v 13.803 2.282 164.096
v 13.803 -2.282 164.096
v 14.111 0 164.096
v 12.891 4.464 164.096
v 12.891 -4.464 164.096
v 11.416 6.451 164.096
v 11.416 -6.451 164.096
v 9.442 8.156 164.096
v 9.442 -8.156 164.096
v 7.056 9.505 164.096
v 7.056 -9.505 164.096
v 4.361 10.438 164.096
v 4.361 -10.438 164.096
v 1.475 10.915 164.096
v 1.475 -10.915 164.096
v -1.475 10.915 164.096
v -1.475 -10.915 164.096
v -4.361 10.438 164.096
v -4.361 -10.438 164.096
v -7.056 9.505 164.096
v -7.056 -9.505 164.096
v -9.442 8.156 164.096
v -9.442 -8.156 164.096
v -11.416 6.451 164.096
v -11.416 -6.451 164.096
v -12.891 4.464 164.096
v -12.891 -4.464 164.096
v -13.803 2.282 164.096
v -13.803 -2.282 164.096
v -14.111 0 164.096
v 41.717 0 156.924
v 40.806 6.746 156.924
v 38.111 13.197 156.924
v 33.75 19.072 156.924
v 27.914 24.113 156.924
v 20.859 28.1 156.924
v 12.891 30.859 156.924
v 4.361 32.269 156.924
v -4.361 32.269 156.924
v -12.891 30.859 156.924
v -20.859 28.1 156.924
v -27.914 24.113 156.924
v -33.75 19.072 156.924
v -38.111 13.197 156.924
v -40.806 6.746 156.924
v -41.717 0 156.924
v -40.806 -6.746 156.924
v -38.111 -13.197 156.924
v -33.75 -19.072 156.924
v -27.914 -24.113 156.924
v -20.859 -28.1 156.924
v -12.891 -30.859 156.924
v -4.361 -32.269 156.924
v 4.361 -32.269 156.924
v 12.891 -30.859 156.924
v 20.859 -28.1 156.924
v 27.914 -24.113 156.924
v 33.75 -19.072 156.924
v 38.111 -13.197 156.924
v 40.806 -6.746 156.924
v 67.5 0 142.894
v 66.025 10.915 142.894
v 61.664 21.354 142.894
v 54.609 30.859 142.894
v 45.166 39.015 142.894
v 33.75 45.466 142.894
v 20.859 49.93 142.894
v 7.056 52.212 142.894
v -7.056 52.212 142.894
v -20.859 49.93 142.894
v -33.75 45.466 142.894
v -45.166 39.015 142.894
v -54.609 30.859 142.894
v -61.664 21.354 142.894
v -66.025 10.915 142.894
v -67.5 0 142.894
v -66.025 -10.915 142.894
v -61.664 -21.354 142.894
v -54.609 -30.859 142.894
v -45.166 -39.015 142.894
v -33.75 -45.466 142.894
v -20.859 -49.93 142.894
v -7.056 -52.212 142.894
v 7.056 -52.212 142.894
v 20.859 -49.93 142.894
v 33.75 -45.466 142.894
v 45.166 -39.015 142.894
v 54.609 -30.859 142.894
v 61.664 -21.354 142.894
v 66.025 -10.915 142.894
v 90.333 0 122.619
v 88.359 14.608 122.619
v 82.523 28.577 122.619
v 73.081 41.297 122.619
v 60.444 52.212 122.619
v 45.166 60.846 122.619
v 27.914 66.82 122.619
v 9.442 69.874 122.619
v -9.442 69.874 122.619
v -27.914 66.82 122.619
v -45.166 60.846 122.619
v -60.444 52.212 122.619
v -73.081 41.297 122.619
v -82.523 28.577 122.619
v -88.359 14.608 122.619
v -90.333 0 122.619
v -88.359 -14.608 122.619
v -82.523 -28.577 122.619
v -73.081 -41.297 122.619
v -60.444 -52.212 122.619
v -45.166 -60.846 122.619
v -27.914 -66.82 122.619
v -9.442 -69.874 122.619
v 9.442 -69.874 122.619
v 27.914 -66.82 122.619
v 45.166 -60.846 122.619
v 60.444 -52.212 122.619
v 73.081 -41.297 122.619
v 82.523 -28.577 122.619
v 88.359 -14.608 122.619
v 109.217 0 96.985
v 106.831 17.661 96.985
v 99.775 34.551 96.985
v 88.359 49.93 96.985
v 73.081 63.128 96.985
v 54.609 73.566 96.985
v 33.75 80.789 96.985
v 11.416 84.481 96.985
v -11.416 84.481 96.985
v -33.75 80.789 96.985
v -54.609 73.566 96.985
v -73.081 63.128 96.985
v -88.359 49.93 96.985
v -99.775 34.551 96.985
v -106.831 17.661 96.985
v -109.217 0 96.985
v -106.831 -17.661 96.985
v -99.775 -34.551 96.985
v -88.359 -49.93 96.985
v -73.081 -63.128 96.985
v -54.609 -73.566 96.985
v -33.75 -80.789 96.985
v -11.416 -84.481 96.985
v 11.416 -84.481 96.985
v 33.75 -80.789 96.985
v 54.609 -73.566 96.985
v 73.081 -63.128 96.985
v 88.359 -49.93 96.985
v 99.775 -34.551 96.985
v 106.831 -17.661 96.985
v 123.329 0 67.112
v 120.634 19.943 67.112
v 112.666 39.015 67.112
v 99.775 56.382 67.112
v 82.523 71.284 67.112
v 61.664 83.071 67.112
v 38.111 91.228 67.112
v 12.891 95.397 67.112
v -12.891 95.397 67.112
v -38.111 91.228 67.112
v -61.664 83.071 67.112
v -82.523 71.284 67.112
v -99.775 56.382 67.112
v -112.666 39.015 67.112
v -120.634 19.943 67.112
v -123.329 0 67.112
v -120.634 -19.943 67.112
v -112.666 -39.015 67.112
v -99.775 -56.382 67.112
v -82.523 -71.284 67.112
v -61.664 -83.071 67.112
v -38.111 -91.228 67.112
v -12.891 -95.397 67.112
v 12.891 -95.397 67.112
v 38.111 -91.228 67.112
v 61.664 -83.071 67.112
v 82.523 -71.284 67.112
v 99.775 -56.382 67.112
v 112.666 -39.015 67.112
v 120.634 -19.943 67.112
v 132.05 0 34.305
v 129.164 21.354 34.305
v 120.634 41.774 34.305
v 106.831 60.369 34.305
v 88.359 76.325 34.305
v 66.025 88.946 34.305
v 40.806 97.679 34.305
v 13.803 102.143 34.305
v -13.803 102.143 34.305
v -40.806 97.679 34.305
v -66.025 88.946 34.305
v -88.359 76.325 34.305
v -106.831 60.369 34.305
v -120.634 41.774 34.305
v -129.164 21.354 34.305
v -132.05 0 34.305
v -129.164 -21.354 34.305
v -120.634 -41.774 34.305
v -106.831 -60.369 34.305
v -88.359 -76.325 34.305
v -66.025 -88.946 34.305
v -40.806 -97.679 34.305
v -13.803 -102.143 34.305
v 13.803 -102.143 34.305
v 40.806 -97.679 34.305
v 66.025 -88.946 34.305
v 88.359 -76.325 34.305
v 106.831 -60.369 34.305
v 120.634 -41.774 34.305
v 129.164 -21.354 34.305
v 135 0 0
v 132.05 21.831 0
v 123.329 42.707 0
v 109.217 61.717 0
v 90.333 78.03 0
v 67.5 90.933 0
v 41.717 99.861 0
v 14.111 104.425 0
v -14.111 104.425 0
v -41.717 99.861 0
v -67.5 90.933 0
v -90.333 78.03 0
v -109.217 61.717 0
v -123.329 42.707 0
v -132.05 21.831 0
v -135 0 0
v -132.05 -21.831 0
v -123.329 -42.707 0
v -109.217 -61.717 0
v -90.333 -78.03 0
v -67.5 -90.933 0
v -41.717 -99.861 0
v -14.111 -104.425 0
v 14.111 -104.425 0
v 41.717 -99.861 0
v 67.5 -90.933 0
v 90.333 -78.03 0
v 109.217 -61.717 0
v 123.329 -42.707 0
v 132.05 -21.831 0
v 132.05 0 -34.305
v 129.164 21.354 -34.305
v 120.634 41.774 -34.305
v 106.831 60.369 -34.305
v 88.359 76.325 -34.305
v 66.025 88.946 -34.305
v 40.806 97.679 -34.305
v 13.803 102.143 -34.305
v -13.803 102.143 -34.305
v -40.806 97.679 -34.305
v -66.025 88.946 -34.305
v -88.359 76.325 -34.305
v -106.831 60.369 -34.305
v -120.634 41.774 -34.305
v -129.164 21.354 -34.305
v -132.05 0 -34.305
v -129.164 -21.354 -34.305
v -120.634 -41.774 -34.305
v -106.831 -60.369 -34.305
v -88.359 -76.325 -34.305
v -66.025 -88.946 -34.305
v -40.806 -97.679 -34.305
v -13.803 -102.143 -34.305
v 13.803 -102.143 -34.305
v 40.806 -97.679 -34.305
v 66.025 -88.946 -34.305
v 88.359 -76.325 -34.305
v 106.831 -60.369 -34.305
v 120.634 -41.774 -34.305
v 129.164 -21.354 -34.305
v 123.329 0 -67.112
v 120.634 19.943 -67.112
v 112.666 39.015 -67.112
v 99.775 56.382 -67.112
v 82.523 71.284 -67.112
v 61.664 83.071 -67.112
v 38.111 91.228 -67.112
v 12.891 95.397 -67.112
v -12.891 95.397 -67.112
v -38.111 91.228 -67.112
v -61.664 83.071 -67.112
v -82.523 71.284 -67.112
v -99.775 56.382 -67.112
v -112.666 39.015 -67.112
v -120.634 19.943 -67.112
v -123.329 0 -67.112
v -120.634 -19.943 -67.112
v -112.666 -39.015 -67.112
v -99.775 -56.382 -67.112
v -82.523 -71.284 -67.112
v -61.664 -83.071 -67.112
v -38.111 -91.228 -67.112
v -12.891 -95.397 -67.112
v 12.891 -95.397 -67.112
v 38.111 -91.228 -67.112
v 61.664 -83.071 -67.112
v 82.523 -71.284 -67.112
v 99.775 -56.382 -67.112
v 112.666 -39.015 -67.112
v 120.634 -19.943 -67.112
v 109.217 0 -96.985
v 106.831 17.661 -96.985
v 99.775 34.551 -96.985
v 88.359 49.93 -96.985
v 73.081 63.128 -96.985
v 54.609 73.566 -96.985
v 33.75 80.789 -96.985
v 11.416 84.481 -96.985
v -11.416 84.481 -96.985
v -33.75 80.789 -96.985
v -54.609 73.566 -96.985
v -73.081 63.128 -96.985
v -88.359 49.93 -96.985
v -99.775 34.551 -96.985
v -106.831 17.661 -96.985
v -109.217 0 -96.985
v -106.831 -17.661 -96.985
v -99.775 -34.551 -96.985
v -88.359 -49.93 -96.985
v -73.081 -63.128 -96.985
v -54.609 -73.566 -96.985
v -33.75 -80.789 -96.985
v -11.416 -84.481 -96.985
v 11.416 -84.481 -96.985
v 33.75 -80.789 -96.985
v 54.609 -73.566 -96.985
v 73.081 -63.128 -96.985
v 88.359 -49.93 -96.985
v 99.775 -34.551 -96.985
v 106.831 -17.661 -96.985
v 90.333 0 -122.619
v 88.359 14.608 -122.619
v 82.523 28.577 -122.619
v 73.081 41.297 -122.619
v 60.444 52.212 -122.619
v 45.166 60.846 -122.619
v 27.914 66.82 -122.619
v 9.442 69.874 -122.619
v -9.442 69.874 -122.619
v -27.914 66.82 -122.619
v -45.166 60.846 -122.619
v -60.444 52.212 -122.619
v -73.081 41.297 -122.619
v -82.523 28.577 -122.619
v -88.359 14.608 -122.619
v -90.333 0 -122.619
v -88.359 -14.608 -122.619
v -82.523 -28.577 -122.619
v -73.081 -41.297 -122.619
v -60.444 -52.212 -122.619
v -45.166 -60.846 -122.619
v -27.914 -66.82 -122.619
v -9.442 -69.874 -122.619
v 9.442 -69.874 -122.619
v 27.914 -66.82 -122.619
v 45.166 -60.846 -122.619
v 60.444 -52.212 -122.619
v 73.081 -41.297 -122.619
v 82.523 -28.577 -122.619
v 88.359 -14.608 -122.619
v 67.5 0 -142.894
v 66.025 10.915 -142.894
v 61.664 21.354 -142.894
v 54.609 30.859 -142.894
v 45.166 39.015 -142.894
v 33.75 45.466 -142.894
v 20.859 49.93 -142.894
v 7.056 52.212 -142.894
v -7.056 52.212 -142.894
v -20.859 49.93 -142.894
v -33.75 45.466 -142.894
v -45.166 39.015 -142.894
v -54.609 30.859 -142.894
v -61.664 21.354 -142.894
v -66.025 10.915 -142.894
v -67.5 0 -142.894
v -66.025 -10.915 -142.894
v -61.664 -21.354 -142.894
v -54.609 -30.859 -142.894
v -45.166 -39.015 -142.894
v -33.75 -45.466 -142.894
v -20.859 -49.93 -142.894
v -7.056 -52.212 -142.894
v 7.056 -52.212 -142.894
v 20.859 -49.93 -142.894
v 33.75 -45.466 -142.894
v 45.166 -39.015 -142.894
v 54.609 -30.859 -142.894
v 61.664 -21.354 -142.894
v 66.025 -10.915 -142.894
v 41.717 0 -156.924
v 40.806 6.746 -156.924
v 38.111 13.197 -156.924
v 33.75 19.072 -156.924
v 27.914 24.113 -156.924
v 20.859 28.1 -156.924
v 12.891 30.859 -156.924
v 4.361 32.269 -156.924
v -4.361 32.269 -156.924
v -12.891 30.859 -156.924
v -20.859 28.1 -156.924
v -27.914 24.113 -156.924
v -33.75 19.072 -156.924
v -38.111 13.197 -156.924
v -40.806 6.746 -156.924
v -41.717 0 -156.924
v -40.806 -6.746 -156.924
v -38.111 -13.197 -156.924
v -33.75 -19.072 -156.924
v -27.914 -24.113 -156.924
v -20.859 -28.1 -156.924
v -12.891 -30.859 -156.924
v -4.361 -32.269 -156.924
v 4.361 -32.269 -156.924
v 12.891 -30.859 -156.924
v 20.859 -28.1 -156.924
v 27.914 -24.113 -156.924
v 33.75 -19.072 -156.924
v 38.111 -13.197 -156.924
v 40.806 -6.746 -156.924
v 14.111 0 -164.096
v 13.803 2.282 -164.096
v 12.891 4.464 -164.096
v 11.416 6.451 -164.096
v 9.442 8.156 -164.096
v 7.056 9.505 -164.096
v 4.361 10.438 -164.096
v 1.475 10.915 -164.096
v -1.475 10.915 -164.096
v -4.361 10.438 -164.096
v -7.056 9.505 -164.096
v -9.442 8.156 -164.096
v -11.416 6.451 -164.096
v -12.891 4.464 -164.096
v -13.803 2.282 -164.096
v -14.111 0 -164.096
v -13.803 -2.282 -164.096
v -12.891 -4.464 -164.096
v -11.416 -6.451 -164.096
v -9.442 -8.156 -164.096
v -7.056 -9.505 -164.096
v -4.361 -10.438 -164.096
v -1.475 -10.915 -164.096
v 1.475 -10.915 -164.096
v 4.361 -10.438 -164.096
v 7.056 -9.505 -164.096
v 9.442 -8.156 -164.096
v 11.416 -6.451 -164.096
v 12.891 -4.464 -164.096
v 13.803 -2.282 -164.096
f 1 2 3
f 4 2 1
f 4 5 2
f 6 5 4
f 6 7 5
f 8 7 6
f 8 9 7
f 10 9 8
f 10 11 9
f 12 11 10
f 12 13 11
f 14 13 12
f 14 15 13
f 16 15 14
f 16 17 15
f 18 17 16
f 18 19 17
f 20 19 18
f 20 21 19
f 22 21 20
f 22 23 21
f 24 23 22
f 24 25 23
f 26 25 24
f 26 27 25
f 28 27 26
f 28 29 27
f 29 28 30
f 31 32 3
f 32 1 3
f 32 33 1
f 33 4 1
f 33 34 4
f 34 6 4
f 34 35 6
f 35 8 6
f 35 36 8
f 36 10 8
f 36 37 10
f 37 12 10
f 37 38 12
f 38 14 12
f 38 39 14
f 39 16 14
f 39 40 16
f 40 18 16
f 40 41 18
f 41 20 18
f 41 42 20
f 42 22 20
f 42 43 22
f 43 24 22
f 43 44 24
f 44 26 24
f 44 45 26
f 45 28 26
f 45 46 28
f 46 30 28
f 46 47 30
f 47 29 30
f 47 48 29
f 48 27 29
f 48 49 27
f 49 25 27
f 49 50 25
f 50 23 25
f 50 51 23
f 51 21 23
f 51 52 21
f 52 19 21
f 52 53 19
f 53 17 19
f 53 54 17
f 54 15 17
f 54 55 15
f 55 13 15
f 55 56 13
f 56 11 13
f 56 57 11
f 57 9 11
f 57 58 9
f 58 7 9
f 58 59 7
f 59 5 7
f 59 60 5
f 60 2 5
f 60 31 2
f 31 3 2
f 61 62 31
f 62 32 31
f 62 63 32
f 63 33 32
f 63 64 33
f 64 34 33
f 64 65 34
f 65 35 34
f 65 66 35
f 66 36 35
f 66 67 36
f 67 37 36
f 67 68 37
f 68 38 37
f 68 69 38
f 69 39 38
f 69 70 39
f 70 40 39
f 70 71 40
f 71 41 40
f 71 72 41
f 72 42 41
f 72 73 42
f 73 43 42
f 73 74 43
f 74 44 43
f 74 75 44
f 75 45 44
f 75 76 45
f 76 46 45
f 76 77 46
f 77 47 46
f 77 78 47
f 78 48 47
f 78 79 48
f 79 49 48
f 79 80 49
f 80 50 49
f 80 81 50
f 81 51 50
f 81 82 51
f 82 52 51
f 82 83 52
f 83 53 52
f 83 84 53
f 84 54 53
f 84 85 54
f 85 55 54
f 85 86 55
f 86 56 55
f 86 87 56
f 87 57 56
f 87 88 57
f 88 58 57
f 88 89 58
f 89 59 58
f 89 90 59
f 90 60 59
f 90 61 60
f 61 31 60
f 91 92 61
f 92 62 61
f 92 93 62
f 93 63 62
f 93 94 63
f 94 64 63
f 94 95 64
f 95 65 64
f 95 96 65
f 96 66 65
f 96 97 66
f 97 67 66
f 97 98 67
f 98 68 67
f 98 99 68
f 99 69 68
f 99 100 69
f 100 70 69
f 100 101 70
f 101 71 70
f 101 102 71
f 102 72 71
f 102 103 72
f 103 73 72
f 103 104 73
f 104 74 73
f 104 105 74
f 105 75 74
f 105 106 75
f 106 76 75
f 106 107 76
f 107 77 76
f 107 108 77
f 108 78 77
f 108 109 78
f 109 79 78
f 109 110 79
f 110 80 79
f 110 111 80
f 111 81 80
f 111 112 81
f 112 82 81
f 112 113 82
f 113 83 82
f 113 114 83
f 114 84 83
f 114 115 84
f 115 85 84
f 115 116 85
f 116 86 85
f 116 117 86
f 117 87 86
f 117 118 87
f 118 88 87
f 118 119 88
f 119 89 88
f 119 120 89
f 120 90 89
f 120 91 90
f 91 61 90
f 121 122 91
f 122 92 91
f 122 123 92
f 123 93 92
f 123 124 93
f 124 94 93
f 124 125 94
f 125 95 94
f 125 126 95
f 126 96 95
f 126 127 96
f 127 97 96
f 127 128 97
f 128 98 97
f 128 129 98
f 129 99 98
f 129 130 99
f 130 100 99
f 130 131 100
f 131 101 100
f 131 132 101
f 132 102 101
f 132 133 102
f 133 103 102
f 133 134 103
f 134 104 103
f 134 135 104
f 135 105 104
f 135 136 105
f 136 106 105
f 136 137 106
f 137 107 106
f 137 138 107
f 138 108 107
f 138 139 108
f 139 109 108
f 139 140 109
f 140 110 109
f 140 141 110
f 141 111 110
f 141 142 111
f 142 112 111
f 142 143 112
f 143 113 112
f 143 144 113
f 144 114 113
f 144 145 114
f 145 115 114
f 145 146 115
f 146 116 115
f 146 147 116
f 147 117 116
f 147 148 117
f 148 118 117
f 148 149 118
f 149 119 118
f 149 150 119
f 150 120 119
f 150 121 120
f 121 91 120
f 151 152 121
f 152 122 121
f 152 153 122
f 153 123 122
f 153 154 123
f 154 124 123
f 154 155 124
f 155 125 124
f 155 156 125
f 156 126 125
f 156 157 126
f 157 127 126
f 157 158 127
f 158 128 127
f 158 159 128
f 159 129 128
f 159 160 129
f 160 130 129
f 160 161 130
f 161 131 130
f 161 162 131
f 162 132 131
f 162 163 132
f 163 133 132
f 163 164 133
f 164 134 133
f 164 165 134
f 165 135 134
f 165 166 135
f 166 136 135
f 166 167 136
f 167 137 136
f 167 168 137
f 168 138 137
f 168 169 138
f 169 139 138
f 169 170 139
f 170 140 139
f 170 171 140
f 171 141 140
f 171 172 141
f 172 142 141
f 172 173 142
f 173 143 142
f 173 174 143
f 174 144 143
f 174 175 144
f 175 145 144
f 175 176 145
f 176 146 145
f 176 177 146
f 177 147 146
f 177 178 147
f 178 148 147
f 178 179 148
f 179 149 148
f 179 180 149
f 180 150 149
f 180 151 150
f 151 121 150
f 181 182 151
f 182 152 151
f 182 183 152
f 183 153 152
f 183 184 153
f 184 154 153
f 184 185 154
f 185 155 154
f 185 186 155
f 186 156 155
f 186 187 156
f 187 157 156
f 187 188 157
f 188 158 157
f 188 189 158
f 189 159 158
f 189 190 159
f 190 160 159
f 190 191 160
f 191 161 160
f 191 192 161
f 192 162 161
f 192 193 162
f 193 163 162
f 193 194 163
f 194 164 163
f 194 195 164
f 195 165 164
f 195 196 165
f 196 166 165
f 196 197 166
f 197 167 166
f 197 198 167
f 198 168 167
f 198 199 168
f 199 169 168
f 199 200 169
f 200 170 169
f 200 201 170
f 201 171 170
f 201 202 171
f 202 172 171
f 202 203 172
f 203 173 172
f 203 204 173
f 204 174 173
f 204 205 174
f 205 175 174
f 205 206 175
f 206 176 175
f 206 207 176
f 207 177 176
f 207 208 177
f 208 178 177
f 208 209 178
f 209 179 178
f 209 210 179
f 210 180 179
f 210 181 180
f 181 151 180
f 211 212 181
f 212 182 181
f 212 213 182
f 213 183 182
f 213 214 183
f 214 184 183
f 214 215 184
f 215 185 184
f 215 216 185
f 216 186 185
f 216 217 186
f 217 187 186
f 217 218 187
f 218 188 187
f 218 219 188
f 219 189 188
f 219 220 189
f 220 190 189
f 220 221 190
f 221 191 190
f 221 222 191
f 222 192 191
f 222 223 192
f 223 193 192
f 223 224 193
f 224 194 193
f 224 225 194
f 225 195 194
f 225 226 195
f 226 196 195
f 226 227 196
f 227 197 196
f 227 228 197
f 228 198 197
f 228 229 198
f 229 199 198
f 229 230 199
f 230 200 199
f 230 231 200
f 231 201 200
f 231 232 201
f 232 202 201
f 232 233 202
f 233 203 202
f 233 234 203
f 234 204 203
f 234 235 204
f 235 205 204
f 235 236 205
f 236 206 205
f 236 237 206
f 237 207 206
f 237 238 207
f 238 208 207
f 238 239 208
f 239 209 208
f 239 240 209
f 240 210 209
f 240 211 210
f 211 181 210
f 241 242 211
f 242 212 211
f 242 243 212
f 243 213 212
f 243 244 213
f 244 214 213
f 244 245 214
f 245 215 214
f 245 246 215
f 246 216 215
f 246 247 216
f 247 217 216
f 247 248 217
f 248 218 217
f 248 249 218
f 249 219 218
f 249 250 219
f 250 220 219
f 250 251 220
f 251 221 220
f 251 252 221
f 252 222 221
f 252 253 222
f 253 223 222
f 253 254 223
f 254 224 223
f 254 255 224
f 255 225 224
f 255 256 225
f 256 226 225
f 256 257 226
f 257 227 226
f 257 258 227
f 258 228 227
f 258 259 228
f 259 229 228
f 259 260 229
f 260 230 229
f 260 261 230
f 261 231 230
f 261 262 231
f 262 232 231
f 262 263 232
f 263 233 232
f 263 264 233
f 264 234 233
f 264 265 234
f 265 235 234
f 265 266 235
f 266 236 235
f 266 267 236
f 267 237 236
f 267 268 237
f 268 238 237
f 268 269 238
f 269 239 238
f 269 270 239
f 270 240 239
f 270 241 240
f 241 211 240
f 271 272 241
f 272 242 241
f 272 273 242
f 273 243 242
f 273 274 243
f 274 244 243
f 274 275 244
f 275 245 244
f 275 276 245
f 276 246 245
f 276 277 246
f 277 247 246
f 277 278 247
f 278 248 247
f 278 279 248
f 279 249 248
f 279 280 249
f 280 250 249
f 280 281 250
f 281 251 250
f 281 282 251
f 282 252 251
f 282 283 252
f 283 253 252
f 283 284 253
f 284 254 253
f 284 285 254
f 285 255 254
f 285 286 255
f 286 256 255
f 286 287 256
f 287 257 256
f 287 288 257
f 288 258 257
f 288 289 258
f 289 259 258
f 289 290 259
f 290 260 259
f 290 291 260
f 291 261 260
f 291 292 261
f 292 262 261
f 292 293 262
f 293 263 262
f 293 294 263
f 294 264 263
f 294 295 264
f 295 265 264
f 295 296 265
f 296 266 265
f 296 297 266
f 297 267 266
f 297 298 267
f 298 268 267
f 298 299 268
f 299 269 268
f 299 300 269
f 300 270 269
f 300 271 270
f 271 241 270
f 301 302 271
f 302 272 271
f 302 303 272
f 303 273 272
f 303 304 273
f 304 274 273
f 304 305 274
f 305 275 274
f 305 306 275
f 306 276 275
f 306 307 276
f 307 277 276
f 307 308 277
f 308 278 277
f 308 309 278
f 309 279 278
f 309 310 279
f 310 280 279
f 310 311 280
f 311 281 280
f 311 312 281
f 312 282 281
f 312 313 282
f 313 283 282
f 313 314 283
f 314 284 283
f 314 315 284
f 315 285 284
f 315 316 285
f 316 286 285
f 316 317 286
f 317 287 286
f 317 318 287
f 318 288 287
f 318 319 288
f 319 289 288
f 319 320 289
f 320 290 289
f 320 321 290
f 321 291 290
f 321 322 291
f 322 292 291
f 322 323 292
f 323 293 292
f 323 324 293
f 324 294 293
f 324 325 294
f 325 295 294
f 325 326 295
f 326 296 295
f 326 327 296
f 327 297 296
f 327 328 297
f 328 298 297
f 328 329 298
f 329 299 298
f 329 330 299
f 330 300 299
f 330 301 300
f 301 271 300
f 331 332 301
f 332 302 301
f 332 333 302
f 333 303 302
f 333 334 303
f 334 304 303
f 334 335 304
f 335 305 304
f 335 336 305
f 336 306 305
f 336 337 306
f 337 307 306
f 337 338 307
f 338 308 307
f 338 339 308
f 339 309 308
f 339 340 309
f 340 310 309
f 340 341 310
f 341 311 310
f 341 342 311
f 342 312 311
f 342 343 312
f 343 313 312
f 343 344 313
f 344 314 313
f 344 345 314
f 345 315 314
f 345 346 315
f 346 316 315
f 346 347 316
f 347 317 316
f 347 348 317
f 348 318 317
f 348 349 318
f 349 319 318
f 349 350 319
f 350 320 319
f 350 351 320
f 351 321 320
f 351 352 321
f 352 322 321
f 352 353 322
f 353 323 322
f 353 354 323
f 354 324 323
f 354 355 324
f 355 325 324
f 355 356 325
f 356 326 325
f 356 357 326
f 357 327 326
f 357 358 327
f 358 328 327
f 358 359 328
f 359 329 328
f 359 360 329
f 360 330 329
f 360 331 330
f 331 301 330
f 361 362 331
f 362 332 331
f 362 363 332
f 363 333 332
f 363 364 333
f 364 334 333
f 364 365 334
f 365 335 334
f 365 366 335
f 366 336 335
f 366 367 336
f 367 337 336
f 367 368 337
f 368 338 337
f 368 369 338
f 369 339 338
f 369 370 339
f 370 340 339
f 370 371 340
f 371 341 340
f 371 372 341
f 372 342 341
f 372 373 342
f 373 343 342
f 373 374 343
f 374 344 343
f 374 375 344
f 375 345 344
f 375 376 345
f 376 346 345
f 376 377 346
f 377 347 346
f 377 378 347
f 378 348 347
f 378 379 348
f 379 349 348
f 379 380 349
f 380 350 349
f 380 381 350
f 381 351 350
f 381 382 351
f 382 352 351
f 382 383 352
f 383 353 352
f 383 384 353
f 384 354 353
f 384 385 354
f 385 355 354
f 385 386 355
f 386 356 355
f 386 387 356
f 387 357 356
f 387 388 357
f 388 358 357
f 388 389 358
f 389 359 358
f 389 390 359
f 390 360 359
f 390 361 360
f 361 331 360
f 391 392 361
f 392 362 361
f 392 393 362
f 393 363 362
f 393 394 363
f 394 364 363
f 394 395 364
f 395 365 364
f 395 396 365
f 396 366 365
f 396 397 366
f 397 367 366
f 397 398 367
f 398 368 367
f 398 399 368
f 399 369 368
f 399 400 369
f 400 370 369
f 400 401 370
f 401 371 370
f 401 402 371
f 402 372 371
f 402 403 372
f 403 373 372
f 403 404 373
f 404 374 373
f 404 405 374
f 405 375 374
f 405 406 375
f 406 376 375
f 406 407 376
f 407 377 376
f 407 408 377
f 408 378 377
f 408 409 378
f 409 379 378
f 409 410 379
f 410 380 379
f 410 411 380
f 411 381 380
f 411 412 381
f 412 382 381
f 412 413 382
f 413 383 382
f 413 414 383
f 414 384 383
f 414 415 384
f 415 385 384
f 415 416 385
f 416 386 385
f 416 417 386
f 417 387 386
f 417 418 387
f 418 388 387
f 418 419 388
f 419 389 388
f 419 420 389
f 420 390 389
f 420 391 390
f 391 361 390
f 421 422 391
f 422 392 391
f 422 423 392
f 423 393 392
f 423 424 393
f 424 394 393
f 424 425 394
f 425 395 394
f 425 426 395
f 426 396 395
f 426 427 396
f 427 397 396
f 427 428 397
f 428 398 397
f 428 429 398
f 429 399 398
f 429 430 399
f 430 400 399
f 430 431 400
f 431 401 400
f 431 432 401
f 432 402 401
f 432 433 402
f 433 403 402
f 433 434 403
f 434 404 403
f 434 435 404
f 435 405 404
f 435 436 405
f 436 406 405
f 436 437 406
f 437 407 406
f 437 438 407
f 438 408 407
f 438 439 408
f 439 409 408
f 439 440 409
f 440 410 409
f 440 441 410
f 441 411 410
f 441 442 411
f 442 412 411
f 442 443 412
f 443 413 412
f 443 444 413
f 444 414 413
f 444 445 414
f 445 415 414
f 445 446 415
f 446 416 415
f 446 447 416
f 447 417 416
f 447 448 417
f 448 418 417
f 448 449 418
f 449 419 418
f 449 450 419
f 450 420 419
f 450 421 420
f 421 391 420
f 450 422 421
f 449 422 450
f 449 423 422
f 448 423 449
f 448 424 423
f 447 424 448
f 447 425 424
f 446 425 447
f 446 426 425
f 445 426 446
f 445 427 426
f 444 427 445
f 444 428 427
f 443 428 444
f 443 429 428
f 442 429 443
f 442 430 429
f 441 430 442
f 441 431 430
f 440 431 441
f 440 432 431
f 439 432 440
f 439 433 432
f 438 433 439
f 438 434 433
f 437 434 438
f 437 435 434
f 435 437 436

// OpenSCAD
// Generated by SolidPython 1.0.1 on 2020-07-29 00:46:48


scale(v = [9, 7, 11]) {
	sphere(r = 15);
}
/***********************************************
*********      SolidPython code:      **********
************************************************
 
# import packages: SolidPython
from solid import *
from solid.utils import *
from itertools import chain, combinations, permutations


class Resize:

    def __init__(self, scad_file):
        self.scad_file = scad_file
        #self.scad_file = import_scad(scad_file)
        # cone/cylinder param:
        self.r1 = 0
        self.r2 = 0
        self.h = 0
        # rectangular prism param:
        self.w = 0
        self.l = 0
        # ellipse param:
        self.r = 0

    # import OpenScad code (file name corresponds to shape)


    # classify shape + parameters
    def assign(self, param1, param2, param3):
        if self.scad_file == 'cone.scad':
            self.r1 = param1
            self.r2 = param2
            self.h = param3
        elif self.scad_file == 'cylinder.scad':
            self.r1 = param1
            self.r2 = param2
            self.h = param3
        elif self.scad_file == 'rectangularPrism.scad':
            self.h = param1
            self.l = param2
            self.w = param3
        else:
            self.r = param1
            self.h = param2

    # resize parameters
    def iterate(self):
        x = range(3, 20, 2)
        i = 1
        if self.scad_file == 'cone.scad':
            tempList = list(permutations(x, 2))
            for temp in tempList:
                param1 = temp[0]
                param2 = temp[1]
                filepath = 'produced_scad_files/' + 'cone' + str(param1) + '_' + str(param2) + '_' + '.scad'
                scad_render_to_file(cylinder(h=param1, r1=param2, r2=0), filepath)

        elif self.scad_file == 'cylinder.scad':
            tempList = list(permutations(x, 3))
            for temp in tempList:
                param1 = temp[0]
                param2 = temp[1]
                filepath = 'produced_scad_files/' + 'cylinder' + str(param1) + '_' + str(param2) + '_' + '.scad'
                scad_render_to_file(cylinder(h=param1, r1=param2, r2=param2), filepath)

        elif self.scad_file == 'rectangularPrism.scad':
            tempList = list(permutations(x, 3))
            for temp in tempList:
                param1 = temp[0]
                param2 = temp[1]
                param3 = temp[2]
                filepath = 'produced_scad_files/' + 'rectangularPrism' + str(param1) + '_' + str(param2) + '_' + str(
                    param3) + '.scad'
                scad_render_to_file(cube(size=(param1, param2, param3)), filepath)

        elif self.scad_file == 'ellipse.scad':
            tempList = list(permutations(x, 4))
            for temp in tempList:
                param1 = temp[0]
                param2 = temp[1]
                param3 = temp[2]
                param4 = temp[3]
                filepath = 'produced_scad_files/' + 'ellipse' + str(param1) + '_' + str(param2) + '_' + str(param3) + '_' + str(param4) + '.scad'
                scad_render_to_file(scale([param1, param2, param3])(sphere(r=param4)), filepath)

    def render_to_scadfile(self):
        scad_render_to_file(scad, 'example.scad') 
 
************************************************/
